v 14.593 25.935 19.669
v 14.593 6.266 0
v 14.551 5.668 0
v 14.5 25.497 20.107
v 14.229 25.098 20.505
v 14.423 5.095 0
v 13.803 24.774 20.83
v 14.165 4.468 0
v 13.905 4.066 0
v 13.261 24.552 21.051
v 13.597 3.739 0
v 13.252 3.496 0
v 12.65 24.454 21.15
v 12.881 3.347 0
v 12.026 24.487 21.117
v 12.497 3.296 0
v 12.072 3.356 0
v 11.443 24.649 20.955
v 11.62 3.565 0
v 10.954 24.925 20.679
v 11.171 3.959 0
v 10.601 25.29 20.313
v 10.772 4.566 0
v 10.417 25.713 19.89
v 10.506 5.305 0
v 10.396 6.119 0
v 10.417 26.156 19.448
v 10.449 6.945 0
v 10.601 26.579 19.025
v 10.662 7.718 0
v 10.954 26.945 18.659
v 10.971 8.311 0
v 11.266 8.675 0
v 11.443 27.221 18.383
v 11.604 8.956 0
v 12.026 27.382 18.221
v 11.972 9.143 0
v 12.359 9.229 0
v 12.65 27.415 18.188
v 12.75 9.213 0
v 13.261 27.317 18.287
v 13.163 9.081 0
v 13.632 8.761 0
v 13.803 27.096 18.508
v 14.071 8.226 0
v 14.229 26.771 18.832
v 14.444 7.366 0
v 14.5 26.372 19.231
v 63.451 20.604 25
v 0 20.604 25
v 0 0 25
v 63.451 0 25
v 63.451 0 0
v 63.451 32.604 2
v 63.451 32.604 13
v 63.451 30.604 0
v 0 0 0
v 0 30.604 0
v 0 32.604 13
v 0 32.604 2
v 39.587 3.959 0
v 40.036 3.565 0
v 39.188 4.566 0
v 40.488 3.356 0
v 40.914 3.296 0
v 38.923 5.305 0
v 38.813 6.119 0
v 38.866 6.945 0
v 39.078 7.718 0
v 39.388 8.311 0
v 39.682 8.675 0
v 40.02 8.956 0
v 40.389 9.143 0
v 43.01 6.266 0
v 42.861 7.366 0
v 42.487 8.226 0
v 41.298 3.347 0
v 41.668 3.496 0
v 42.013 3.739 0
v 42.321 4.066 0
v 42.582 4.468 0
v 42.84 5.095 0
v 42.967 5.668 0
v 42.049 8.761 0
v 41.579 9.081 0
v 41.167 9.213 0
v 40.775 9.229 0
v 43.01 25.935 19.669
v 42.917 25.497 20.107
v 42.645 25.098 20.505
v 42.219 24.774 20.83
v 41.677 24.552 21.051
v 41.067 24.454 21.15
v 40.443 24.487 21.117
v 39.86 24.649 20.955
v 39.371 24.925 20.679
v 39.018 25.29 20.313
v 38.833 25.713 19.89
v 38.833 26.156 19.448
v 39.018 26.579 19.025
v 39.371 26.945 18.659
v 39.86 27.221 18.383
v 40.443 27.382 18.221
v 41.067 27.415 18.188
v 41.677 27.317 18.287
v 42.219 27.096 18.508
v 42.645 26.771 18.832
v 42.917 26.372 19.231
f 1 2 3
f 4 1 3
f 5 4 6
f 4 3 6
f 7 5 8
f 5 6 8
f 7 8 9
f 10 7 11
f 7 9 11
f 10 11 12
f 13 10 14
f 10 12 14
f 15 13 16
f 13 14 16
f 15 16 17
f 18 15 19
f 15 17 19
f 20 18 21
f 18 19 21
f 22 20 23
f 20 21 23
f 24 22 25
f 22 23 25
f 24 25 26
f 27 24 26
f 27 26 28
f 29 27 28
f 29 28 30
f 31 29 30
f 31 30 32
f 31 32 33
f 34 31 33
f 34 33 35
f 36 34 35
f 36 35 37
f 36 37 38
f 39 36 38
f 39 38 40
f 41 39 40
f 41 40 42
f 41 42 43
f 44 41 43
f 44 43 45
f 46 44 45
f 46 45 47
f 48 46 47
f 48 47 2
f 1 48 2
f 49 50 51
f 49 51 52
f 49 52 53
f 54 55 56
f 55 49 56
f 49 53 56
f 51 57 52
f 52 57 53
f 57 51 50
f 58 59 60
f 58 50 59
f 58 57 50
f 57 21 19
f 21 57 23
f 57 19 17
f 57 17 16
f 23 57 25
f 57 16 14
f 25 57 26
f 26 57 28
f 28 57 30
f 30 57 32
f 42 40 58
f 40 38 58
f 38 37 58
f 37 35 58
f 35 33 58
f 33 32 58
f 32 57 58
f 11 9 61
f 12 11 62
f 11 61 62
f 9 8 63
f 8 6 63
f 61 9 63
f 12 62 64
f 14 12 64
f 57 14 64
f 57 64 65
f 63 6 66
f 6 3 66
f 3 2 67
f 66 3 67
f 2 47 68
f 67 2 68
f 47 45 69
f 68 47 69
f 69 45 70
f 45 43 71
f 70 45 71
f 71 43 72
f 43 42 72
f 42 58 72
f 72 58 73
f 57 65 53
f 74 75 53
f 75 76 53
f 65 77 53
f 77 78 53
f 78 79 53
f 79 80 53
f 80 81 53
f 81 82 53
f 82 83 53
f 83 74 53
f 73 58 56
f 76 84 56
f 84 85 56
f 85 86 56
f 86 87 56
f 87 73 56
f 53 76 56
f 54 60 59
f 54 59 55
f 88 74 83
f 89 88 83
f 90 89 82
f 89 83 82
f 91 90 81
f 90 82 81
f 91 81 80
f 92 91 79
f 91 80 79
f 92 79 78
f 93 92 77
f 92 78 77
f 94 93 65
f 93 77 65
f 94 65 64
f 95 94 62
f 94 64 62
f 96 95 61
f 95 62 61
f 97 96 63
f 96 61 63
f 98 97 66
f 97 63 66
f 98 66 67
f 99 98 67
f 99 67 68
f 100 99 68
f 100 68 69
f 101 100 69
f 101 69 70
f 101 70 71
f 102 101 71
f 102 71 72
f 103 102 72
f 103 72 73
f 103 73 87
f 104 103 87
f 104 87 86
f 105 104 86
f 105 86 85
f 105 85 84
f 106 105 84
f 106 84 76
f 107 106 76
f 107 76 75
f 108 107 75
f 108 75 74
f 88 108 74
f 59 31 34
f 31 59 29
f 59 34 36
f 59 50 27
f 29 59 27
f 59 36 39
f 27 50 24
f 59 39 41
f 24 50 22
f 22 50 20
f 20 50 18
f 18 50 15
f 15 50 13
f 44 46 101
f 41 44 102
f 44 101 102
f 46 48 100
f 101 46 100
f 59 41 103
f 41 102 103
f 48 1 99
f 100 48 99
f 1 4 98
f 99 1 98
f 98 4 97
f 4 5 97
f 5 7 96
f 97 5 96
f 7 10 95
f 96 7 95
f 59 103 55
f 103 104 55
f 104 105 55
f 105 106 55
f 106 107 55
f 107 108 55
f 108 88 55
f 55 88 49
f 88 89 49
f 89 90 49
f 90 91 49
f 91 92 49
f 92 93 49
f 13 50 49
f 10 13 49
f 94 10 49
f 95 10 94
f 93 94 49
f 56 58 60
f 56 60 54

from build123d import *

# Parameters (mm, degrees)
F0_W     = 63.4514391422
F0_H     = 32.6035022736
F1_DEPTH = 25
F2_SIZE  = 12
F4_D     = 4.2
F5_SIZE  = 2


with BuildPart() as f1:
    # F0 (on Top) → F1 (new body)
    with BuildSketch(Plane.XY):
        with Locations((31.7257195711, 16.3017511368)):
            Rectangle(F0_W, F0_H)
    extrude(amount=F1_DEPTH)

    # F2
    f2_edges = [f1.edges().sort_by_distance(p)[0] for p in [
        (31.72572, 32.603502, 25),
    ]]
    chamfer(f2_edges, length=F2_SIZE)

    # F4 (through all)
    with Locations(Plane(origin=(0, 22.8017511368, 22.8017511368), x_dir=(-1, 0, 0), z_dir=(0, 0.7071067812, 0.7071067812))):
        with Locations((-12.4934799969, -4.4305082411), (-40.9099496901, -4.4305082411)):
            Hole(F4_D / 2)

    # F5
    f5_edges = [f1.edges().sort_by_distance(p)[0] for p in [
        (31.72572, 32.603502, 0),
    ]]
    chamfer(f5_edges, length=F5_SIZE)


solid = f1.part
